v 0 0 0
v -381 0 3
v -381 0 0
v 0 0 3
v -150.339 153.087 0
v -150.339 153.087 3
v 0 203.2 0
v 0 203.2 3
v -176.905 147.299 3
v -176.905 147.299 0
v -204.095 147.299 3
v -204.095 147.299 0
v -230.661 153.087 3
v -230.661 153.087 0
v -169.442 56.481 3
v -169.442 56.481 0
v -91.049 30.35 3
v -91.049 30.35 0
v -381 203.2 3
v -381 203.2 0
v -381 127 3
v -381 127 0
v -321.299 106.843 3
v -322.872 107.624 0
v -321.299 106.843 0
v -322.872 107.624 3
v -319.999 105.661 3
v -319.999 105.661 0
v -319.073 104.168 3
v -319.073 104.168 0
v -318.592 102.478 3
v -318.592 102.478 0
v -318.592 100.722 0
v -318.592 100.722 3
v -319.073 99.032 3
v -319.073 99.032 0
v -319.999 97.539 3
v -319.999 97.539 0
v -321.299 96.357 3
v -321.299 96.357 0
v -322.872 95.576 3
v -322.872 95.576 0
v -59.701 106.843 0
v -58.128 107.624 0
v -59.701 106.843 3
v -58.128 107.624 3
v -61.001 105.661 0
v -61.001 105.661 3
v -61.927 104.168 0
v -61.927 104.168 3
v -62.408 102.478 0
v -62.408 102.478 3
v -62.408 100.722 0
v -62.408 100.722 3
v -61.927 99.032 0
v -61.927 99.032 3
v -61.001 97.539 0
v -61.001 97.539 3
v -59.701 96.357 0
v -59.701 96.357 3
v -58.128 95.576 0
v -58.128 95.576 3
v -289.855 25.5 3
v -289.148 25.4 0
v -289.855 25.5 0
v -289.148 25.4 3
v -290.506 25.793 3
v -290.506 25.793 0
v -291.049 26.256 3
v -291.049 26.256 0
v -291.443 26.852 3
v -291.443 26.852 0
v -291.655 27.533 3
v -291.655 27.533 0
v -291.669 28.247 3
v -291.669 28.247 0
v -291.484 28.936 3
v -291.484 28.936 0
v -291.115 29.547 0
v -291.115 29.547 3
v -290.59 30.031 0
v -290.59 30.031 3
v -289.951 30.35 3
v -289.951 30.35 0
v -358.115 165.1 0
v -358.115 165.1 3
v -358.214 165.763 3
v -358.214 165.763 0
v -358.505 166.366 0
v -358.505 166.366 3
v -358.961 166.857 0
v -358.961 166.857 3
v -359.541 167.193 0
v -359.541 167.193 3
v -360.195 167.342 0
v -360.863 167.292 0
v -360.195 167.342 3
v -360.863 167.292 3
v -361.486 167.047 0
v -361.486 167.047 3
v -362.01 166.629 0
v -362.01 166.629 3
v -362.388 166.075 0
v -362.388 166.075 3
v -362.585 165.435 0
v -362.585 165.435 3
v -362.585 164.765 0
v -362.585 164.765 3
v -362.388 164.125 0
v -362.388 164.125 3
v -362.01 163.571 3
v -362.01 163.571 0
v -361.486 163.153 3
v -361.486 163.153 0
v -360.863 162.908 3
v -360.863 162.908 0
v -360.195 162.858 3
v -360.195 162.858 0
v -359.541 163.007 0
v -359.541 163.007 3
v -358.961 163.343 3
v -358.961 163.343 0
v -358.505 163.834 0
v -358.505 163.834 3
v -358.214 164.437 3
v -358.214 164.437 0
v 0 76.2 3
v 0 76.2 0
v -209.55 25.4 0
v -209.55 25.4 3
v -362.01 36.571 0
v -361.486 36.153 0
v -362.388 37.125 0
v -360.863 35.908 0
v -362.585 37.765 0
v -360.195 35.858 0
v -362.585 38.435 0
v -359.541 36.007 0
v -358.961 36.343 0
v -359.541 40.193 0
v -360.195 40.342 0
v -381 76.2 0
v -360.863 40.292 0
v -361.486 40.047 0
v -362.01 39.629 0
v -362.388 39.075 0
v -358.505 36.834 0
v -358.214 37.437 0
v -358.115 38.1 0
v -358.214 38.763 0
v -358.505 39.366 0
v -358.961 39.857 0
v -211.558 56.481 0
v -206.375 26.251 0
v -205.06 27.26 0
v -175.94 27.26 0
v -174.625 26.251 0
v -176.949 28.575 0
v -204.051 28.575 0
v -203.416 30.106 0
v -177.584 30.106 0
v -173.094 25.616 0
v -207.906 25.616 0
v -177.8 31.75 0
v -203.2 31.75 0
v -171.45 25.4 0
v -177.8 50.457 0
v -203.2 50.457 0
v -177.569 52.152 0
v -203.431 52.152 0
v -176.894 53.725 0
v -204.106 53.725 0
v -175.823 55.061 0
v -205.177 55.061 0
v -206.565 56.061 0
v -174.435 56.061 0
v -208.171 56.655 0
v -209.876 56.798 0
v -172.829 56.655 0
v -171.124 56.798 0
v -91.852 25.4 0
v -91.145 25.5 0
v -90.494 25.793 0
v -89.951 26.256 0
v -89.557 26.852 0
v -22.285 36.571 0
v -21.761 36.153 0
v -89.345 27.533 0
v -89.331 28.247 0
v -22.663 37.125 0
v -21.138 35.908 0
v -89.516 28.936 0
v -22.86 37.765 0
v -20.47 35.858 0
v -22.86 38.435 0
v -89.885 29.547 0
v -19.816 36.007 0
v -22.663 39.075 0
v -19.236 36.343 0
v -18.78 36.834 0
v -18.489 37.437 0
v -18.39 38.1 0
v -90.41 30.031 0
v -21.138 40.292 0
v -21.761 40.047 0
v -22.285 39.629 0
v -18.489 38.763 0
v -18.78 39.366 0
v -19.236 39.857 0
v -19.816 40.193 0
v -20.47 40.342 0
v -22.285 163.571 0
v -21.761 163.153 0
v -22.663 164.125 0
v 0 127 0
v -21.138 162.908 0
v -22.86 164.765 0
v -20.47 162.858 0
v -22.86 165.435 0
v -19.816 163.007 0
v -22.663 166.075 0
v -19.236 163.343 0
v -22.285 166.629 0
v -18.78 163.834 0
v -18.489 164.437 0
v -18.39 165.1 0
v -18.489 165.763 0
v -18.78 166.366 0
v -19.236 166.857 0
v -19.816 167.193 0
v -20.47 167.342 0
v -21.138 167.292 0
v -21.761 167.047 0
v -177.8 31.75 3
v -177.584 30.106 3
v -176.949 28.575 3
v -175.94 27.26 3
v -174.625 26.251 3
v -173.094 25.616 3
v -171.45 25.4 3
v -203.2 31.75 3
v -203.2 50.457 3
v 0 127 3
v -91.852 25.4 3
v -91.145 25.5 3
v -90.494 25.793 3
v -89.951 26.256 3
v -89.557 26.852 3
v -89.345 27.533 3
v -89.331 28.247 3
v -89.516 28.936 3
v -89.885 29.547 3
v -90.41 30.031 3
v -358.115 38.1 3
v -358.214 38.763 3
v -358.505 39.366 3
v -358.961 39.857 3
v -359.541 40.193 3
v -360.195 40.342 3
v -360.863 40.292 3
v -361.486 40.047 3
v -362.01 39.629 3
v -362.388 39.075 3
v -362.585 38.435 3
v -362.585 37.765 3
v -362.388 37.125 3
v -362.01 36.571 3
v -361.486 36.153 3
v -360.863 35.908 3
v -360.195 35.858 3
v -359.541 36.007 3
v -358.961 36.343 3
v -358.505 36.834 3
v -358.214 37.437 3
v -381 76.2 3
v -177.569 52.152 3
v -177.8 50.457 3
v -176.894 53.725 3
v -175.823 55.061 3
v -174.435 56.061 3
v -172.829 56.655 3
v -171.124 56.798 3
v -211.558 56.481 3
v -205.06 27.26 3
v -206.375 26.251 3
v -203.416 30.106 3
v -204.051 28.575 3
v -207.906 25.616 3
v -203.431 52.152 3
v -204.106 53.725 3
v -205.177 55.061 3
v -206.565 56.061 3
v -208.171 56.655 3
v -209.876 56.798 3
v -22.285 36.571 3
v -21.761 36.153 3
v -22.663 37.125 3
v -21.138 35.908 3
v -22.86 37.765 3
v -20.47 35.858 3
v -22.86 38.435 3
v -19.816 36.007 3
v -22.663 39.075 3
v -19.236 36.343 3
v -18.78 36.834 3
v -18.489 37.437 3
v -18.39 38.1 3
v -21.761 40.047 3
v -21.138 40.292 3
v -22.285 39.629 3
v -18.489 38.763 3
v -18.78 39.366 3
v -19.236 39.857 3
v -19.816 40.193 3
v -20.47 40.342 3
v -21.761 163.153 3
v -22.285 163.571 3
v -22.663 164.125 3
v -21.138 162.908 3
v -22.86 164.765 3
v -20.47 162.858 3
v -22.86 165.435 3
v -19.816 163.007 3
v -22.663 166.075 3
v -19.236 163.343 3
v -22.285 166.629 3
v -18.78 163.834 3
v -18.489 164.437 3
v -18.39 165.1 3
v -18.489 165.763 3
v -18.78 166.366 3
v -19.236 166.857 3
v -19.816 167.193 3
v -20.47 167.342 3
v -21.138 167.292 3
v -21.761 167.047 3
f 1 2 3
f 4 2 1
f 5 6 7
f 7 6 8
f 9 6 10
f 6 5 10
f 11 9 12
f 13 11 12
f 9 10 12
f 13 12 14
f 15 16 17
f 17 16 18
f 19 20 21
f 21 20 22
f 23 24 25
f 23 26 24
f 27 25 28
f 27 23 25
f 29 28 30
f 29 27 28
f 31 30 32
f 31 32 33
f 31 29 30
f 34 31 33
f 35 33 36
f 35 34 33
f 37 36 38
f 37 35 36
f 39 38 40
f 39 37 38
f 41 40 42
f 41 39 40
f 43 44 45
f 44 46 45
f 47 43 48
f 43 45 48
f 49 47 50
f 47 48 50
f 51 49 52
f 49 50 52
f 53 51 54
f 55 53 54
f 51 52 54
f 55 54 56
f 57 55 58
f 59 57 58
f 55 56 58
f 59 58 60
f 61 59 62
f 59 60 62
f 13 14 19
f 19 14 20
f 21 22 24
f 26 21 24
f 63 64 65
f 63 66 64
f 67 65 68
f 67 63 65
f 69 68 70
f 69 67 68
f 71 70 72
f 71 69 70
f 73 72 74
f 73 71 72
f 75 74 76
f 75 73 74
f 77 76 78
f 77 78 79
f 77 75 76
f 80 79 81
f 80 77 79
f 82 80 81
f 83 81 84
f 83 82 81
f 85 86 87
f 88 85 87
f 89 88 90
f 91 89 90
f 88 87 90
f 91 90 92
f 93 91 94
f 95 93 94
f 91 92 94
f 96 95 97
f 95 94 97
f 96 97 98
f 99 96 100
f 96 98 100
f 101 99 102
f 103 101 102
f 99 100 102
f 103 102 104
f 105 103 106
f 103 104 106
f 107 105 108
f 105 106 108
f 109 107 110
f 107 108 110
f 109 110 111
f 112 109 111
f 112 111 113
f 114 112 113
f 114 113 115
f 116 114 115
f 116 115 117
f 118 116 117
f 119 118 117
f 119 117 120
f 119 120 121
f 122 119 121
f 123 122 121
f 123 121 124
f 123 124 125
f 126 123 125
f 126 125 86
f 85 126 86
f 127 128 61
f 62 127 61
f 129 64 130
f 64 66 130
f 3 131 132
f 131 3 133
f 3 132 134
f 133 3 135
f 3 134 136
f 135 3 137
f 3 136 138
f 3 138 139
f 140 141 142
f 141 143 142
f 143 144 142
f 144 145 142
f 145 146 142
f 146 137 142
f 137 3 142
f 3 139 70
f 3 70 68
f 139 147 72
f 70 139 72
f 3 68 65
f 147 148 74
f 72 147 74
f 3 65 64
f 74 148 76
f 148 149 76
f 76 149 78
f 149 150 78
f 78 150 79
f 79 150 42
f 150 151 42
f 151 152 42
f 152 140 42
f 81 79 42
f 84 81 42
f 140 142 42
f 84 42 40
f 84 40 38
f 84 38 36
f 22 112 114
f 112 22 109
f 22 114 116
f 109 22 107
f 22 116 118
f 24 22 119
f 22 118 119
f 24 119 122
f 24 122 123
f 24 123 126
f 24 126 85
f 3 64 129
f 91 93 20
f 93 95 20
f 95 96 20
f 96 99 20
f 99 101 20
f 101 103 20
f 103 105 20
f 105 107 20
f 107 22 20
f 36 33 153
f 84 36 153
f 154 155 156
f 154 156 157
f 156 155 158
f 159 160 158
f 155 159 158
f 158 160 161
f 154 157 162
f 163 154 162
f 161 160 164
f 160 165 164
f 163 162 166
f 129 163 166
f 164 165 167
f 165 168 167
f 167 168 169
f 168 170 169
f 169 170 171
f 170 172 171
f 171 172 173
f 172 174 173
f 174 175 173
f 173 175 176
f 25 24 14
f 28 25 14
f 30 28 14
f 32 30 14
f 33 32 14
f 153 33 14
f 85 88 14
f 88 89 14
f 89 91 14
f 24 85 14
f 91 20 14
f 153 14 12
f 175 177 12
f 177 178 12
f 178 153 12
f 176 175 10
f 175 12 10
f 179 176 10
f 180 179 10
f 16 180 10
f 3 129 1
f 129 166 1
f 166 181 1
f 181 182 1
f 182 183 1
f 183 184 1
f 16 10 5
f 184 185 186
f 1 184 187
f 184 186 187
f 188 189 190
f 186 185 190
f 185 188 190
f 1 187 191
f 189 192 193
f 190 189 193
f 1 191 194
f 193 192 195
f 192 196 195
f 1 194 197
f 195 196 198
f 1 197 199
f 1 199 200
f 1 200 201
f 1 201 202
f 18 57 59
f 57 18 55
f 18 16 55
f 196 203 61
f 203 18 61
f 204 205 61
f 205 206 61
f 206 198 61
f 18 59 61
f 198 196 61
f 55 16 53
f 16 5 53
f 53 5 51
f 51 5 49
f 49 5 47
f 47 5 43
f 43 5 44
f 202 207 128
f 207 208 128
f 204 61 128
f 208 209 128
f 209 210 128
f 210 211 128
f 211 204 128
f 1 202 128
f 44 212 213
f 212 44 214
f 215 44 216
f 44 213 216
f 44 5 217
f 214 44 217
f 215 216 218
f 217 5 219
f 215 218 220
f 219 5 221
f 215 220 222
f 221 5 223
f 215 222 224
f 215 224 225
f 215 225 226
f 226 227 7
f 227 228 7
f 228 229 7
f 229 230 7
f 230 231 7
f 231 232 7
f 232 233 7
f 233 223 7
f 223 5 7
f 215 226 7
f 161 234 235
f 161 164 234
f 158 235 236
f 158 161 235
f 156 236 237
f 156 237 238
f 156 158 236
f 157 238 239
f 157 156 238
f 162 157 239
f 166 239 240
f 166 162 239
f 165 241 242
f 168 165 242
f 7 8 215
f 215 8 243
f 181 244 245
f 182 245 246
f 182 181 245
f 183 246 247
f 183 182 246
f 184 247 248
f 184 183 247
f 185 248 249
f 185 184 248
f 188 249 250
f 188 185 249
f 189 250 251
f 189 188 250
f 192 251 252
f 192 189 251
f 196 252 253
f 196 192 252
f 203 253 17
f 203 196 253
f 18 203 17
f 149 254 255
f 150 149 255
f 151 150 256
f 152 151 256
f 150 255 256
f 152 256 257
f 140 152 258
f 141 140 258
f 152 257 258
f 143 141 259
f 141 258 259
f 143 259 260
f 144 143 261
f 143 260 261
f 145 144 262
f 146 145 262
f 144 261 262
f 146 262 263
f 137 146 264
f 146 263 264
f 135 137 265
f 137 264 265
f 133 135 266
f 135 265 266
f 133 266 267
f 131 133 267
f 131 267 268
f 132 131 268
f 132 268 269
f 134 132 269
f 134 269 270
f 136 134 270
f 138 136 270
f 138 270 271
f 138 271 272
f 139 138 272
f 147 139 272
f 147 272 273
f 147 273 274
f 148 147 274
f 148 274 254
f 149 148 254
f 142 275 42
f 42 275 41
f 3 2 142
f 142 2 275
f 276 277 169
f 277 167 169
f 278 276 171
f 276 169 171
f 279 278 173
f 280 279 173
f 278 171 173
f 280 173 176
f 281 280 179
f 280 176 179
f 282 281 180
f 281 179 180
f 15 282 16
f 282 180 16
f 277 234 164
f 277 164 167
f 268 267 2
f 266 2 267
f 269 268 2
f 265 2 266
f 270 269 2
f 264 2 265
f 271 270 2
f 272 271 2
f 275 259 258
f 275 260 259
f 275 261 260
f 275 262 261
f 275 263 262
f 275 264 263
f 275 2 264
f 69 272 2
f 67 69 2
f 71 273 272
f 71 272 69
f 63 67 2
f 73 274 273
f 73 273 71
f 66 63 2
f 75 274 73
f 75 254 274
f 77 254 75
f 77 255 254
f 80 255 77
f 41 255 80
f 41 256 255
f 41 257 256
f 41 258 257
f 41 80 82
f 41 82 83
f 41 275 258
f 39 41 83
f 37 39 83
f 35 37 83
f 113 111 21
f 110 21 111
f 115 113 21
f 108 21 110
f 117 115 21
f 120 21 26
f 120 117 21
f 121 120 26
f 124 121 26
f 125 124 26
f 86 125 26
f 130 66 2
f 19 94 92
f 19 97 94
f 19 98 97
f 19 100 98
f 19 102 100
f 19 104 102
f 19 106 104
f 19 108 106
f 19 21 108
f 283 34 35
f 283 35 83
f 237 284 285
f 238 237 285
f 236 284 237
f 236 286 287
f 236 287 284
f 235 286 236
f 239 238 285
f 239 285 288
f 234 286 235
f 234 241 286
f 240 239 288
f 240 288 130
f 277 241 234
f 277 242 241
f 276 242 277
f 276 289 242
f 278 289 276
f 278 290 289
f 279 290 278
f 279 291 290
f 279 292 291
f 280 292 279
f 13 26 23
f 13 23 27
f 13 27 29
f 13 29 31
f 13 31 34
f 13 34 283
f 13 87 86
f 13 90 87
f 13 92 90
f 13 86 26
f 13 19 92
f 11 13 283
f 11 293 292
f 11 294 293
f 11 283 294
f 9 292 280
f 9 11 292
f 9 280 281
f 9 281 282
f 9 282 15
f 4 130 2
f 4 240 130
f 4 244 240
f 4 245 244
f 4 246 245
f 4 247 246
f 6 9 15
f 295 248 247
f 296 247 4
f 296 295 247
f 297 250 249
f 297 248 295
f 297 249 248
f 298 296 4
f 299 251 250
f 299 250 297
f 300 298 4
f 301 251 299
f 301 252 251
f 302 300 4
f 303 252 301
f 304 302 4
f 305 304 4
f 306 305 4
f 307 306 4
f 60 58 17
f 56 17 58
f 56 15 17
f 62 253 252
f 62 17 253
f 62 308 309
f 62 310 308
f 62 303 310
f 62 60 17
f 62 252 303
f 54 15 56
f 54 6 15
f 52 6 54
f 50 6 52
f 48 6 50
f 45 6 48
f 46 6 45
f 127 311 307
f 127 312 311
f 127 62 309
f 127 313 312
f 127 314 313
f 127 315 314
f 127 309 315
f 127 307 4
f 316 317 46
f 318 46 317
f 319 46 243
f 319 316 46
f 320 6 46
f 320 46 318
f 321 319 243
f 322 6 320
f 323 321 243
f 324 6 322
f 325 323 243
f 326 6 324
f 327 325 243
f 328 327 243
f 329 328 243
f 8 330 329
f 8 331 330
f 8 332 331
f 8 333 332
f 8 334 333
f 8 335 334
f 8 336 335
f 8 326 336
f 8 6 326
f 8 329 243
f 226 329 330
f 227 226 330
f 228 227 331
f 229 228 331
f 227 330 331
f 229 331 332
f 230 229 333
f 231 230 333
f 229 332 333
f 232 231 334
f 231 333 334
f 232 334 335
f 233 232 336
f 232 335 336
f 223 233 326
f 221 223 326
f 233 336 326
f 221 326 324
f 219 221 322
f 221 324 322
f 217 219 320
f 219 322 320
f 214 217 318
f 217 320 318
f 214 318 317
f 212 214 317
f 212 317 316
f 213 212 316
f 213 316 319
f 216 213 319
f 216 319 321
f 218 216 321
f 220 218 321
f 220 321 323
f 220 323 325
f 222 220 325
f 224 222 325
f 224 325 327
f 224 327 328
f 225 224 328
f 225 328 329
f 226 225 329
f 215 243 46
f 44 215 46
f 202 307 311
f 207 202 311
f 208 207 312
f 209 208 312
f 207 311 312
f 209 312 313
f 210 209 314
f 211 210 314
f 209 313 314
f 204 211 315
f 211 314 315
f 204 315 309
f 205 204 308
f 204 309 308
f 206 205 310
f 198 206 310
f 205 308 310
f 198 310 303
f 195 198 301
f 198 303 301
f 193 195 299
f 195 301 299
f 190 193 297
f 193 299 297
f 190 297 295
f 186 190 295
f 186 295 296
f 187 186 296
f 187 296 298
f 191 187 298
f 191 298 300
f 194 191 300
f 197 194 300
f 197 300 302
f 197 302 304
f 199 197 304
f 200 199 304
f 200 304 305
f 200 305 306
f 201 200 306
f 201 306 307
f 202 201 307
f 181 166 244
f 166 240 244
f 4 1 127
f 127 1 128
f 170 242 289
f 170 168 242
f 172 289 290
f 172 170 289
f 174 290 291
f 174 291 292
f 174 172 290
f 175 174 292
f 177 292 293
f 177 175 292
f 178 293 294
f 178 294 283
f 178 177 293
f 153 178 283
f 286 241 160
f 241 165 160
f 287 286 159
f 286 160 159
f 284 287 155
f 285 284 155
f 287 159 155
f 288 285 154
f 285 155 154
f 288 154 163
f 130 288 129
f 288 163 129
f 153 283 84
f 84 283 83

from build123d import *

# Parameters (mm, degrees)
BOSS_EXTRUDE1_DEPTH   = 3
SKETCH3_W             = 190.5
SKETCH3_H             = 25.4
BOSS_EXTRUDE2_DEPTH   = 3
BODY_MOVE_COPY1_ANGLE = 180
SKETCH5_W             = 25.4
SKETCH5_H             = 38.1
BOSS_EXTRUDE3_DEPTH   = 3
FILLET1_R             = 127
FILLET2_R             = 6.35
FILLET3_R             = 2.54
F_8_CLEARANCE_HOLE1_D = 4.4958


with BuildPart() as part:
    # Sketch1 → Boss-Extrude1 (new body)
    with BuildSketch(Plane.XY):
        Polygon((-381, 127), (0, 0), (0, 76.2), (-381, 203.2), align=None)
    extrude(amount=BOSS_EXTRUDE1_DEPTH)

    # Sketch3 → Boss-Extrude2 (add)
    with BuildSketch(Plane.XY.offset(3)):
        with Locations((-95.25, 12.7)):
            Rectangle(SKETCH3_W, SKETCH3_H)
    extrude(amount=-BOSS_EXTRUDE2_DEPTH)


with BuildPart() as body_2:
    # Body-Move_Copy1: copy of part
    add(part.part.rotate(Axis((-190.5, 0, 1.5), (0, 1, 0)), BODY_MOVE_COPY1_ANGLE))

    # Combine1: union part
    add(part.part)

    # Sketch5 → Boss-Extrude3 (add)
    with BuildSketch(Plane.XY.offset(3)):
        with Locations((-190.5, 44.45)):
            Rectangle(SKETCH5_W, SKETCH5_H)
    extrude(amount=-BOSS_EXTRUDE3_DEPTH)

    # Fillet1
    fillet1_edges = [body_2.edges().sort_by_distance(p)[0] for p in [
        (-190.5, 139.7, 1.5),
    ]]
    fillet(fillet1_edges, radius=FILLET1_R)

    # Fillet2
    fillet2_edges = [body_2.edges().sort_by_distance(p)[0] for p in [
        (-304.8, 101.6, 1.5),
        (-76.2, 101.6, 1.5),
        (-177.8, 59.266666667, 1.5),
        (-203.2, 25.4, 1.5),
        (-177.8, 25.4, 1.5),
        (-203.2, 59.266666667, 1.5),
    ]]
    fillet(fillet2_edges, radius=FILLET2_R)

    # Fillet3
    fillet3_edges = [body_2.edges().sort_by_distance(p)[0] for p in [
        (-304.8, 25.4, 1.5),
        (-76.2, 25.4, 1.5),
    ]]
    fillet(fillet3_edges, radius=FILLET3_R)

    # 8 Clearance Hole1 (through all)
    with Locations(Plane(origin=(0, 0, 0), x_dir=(-1, 0, 0), z_dir=(0, 0, -1))):
        with Locations((20.6375, 165.1), (360.3625, 165.1), (20.6375, 38.1), (360.3625, 38.1)):
            Hole(F_8_CLEARANCE_HOLE1_D / 2)


solid = body_2.part
